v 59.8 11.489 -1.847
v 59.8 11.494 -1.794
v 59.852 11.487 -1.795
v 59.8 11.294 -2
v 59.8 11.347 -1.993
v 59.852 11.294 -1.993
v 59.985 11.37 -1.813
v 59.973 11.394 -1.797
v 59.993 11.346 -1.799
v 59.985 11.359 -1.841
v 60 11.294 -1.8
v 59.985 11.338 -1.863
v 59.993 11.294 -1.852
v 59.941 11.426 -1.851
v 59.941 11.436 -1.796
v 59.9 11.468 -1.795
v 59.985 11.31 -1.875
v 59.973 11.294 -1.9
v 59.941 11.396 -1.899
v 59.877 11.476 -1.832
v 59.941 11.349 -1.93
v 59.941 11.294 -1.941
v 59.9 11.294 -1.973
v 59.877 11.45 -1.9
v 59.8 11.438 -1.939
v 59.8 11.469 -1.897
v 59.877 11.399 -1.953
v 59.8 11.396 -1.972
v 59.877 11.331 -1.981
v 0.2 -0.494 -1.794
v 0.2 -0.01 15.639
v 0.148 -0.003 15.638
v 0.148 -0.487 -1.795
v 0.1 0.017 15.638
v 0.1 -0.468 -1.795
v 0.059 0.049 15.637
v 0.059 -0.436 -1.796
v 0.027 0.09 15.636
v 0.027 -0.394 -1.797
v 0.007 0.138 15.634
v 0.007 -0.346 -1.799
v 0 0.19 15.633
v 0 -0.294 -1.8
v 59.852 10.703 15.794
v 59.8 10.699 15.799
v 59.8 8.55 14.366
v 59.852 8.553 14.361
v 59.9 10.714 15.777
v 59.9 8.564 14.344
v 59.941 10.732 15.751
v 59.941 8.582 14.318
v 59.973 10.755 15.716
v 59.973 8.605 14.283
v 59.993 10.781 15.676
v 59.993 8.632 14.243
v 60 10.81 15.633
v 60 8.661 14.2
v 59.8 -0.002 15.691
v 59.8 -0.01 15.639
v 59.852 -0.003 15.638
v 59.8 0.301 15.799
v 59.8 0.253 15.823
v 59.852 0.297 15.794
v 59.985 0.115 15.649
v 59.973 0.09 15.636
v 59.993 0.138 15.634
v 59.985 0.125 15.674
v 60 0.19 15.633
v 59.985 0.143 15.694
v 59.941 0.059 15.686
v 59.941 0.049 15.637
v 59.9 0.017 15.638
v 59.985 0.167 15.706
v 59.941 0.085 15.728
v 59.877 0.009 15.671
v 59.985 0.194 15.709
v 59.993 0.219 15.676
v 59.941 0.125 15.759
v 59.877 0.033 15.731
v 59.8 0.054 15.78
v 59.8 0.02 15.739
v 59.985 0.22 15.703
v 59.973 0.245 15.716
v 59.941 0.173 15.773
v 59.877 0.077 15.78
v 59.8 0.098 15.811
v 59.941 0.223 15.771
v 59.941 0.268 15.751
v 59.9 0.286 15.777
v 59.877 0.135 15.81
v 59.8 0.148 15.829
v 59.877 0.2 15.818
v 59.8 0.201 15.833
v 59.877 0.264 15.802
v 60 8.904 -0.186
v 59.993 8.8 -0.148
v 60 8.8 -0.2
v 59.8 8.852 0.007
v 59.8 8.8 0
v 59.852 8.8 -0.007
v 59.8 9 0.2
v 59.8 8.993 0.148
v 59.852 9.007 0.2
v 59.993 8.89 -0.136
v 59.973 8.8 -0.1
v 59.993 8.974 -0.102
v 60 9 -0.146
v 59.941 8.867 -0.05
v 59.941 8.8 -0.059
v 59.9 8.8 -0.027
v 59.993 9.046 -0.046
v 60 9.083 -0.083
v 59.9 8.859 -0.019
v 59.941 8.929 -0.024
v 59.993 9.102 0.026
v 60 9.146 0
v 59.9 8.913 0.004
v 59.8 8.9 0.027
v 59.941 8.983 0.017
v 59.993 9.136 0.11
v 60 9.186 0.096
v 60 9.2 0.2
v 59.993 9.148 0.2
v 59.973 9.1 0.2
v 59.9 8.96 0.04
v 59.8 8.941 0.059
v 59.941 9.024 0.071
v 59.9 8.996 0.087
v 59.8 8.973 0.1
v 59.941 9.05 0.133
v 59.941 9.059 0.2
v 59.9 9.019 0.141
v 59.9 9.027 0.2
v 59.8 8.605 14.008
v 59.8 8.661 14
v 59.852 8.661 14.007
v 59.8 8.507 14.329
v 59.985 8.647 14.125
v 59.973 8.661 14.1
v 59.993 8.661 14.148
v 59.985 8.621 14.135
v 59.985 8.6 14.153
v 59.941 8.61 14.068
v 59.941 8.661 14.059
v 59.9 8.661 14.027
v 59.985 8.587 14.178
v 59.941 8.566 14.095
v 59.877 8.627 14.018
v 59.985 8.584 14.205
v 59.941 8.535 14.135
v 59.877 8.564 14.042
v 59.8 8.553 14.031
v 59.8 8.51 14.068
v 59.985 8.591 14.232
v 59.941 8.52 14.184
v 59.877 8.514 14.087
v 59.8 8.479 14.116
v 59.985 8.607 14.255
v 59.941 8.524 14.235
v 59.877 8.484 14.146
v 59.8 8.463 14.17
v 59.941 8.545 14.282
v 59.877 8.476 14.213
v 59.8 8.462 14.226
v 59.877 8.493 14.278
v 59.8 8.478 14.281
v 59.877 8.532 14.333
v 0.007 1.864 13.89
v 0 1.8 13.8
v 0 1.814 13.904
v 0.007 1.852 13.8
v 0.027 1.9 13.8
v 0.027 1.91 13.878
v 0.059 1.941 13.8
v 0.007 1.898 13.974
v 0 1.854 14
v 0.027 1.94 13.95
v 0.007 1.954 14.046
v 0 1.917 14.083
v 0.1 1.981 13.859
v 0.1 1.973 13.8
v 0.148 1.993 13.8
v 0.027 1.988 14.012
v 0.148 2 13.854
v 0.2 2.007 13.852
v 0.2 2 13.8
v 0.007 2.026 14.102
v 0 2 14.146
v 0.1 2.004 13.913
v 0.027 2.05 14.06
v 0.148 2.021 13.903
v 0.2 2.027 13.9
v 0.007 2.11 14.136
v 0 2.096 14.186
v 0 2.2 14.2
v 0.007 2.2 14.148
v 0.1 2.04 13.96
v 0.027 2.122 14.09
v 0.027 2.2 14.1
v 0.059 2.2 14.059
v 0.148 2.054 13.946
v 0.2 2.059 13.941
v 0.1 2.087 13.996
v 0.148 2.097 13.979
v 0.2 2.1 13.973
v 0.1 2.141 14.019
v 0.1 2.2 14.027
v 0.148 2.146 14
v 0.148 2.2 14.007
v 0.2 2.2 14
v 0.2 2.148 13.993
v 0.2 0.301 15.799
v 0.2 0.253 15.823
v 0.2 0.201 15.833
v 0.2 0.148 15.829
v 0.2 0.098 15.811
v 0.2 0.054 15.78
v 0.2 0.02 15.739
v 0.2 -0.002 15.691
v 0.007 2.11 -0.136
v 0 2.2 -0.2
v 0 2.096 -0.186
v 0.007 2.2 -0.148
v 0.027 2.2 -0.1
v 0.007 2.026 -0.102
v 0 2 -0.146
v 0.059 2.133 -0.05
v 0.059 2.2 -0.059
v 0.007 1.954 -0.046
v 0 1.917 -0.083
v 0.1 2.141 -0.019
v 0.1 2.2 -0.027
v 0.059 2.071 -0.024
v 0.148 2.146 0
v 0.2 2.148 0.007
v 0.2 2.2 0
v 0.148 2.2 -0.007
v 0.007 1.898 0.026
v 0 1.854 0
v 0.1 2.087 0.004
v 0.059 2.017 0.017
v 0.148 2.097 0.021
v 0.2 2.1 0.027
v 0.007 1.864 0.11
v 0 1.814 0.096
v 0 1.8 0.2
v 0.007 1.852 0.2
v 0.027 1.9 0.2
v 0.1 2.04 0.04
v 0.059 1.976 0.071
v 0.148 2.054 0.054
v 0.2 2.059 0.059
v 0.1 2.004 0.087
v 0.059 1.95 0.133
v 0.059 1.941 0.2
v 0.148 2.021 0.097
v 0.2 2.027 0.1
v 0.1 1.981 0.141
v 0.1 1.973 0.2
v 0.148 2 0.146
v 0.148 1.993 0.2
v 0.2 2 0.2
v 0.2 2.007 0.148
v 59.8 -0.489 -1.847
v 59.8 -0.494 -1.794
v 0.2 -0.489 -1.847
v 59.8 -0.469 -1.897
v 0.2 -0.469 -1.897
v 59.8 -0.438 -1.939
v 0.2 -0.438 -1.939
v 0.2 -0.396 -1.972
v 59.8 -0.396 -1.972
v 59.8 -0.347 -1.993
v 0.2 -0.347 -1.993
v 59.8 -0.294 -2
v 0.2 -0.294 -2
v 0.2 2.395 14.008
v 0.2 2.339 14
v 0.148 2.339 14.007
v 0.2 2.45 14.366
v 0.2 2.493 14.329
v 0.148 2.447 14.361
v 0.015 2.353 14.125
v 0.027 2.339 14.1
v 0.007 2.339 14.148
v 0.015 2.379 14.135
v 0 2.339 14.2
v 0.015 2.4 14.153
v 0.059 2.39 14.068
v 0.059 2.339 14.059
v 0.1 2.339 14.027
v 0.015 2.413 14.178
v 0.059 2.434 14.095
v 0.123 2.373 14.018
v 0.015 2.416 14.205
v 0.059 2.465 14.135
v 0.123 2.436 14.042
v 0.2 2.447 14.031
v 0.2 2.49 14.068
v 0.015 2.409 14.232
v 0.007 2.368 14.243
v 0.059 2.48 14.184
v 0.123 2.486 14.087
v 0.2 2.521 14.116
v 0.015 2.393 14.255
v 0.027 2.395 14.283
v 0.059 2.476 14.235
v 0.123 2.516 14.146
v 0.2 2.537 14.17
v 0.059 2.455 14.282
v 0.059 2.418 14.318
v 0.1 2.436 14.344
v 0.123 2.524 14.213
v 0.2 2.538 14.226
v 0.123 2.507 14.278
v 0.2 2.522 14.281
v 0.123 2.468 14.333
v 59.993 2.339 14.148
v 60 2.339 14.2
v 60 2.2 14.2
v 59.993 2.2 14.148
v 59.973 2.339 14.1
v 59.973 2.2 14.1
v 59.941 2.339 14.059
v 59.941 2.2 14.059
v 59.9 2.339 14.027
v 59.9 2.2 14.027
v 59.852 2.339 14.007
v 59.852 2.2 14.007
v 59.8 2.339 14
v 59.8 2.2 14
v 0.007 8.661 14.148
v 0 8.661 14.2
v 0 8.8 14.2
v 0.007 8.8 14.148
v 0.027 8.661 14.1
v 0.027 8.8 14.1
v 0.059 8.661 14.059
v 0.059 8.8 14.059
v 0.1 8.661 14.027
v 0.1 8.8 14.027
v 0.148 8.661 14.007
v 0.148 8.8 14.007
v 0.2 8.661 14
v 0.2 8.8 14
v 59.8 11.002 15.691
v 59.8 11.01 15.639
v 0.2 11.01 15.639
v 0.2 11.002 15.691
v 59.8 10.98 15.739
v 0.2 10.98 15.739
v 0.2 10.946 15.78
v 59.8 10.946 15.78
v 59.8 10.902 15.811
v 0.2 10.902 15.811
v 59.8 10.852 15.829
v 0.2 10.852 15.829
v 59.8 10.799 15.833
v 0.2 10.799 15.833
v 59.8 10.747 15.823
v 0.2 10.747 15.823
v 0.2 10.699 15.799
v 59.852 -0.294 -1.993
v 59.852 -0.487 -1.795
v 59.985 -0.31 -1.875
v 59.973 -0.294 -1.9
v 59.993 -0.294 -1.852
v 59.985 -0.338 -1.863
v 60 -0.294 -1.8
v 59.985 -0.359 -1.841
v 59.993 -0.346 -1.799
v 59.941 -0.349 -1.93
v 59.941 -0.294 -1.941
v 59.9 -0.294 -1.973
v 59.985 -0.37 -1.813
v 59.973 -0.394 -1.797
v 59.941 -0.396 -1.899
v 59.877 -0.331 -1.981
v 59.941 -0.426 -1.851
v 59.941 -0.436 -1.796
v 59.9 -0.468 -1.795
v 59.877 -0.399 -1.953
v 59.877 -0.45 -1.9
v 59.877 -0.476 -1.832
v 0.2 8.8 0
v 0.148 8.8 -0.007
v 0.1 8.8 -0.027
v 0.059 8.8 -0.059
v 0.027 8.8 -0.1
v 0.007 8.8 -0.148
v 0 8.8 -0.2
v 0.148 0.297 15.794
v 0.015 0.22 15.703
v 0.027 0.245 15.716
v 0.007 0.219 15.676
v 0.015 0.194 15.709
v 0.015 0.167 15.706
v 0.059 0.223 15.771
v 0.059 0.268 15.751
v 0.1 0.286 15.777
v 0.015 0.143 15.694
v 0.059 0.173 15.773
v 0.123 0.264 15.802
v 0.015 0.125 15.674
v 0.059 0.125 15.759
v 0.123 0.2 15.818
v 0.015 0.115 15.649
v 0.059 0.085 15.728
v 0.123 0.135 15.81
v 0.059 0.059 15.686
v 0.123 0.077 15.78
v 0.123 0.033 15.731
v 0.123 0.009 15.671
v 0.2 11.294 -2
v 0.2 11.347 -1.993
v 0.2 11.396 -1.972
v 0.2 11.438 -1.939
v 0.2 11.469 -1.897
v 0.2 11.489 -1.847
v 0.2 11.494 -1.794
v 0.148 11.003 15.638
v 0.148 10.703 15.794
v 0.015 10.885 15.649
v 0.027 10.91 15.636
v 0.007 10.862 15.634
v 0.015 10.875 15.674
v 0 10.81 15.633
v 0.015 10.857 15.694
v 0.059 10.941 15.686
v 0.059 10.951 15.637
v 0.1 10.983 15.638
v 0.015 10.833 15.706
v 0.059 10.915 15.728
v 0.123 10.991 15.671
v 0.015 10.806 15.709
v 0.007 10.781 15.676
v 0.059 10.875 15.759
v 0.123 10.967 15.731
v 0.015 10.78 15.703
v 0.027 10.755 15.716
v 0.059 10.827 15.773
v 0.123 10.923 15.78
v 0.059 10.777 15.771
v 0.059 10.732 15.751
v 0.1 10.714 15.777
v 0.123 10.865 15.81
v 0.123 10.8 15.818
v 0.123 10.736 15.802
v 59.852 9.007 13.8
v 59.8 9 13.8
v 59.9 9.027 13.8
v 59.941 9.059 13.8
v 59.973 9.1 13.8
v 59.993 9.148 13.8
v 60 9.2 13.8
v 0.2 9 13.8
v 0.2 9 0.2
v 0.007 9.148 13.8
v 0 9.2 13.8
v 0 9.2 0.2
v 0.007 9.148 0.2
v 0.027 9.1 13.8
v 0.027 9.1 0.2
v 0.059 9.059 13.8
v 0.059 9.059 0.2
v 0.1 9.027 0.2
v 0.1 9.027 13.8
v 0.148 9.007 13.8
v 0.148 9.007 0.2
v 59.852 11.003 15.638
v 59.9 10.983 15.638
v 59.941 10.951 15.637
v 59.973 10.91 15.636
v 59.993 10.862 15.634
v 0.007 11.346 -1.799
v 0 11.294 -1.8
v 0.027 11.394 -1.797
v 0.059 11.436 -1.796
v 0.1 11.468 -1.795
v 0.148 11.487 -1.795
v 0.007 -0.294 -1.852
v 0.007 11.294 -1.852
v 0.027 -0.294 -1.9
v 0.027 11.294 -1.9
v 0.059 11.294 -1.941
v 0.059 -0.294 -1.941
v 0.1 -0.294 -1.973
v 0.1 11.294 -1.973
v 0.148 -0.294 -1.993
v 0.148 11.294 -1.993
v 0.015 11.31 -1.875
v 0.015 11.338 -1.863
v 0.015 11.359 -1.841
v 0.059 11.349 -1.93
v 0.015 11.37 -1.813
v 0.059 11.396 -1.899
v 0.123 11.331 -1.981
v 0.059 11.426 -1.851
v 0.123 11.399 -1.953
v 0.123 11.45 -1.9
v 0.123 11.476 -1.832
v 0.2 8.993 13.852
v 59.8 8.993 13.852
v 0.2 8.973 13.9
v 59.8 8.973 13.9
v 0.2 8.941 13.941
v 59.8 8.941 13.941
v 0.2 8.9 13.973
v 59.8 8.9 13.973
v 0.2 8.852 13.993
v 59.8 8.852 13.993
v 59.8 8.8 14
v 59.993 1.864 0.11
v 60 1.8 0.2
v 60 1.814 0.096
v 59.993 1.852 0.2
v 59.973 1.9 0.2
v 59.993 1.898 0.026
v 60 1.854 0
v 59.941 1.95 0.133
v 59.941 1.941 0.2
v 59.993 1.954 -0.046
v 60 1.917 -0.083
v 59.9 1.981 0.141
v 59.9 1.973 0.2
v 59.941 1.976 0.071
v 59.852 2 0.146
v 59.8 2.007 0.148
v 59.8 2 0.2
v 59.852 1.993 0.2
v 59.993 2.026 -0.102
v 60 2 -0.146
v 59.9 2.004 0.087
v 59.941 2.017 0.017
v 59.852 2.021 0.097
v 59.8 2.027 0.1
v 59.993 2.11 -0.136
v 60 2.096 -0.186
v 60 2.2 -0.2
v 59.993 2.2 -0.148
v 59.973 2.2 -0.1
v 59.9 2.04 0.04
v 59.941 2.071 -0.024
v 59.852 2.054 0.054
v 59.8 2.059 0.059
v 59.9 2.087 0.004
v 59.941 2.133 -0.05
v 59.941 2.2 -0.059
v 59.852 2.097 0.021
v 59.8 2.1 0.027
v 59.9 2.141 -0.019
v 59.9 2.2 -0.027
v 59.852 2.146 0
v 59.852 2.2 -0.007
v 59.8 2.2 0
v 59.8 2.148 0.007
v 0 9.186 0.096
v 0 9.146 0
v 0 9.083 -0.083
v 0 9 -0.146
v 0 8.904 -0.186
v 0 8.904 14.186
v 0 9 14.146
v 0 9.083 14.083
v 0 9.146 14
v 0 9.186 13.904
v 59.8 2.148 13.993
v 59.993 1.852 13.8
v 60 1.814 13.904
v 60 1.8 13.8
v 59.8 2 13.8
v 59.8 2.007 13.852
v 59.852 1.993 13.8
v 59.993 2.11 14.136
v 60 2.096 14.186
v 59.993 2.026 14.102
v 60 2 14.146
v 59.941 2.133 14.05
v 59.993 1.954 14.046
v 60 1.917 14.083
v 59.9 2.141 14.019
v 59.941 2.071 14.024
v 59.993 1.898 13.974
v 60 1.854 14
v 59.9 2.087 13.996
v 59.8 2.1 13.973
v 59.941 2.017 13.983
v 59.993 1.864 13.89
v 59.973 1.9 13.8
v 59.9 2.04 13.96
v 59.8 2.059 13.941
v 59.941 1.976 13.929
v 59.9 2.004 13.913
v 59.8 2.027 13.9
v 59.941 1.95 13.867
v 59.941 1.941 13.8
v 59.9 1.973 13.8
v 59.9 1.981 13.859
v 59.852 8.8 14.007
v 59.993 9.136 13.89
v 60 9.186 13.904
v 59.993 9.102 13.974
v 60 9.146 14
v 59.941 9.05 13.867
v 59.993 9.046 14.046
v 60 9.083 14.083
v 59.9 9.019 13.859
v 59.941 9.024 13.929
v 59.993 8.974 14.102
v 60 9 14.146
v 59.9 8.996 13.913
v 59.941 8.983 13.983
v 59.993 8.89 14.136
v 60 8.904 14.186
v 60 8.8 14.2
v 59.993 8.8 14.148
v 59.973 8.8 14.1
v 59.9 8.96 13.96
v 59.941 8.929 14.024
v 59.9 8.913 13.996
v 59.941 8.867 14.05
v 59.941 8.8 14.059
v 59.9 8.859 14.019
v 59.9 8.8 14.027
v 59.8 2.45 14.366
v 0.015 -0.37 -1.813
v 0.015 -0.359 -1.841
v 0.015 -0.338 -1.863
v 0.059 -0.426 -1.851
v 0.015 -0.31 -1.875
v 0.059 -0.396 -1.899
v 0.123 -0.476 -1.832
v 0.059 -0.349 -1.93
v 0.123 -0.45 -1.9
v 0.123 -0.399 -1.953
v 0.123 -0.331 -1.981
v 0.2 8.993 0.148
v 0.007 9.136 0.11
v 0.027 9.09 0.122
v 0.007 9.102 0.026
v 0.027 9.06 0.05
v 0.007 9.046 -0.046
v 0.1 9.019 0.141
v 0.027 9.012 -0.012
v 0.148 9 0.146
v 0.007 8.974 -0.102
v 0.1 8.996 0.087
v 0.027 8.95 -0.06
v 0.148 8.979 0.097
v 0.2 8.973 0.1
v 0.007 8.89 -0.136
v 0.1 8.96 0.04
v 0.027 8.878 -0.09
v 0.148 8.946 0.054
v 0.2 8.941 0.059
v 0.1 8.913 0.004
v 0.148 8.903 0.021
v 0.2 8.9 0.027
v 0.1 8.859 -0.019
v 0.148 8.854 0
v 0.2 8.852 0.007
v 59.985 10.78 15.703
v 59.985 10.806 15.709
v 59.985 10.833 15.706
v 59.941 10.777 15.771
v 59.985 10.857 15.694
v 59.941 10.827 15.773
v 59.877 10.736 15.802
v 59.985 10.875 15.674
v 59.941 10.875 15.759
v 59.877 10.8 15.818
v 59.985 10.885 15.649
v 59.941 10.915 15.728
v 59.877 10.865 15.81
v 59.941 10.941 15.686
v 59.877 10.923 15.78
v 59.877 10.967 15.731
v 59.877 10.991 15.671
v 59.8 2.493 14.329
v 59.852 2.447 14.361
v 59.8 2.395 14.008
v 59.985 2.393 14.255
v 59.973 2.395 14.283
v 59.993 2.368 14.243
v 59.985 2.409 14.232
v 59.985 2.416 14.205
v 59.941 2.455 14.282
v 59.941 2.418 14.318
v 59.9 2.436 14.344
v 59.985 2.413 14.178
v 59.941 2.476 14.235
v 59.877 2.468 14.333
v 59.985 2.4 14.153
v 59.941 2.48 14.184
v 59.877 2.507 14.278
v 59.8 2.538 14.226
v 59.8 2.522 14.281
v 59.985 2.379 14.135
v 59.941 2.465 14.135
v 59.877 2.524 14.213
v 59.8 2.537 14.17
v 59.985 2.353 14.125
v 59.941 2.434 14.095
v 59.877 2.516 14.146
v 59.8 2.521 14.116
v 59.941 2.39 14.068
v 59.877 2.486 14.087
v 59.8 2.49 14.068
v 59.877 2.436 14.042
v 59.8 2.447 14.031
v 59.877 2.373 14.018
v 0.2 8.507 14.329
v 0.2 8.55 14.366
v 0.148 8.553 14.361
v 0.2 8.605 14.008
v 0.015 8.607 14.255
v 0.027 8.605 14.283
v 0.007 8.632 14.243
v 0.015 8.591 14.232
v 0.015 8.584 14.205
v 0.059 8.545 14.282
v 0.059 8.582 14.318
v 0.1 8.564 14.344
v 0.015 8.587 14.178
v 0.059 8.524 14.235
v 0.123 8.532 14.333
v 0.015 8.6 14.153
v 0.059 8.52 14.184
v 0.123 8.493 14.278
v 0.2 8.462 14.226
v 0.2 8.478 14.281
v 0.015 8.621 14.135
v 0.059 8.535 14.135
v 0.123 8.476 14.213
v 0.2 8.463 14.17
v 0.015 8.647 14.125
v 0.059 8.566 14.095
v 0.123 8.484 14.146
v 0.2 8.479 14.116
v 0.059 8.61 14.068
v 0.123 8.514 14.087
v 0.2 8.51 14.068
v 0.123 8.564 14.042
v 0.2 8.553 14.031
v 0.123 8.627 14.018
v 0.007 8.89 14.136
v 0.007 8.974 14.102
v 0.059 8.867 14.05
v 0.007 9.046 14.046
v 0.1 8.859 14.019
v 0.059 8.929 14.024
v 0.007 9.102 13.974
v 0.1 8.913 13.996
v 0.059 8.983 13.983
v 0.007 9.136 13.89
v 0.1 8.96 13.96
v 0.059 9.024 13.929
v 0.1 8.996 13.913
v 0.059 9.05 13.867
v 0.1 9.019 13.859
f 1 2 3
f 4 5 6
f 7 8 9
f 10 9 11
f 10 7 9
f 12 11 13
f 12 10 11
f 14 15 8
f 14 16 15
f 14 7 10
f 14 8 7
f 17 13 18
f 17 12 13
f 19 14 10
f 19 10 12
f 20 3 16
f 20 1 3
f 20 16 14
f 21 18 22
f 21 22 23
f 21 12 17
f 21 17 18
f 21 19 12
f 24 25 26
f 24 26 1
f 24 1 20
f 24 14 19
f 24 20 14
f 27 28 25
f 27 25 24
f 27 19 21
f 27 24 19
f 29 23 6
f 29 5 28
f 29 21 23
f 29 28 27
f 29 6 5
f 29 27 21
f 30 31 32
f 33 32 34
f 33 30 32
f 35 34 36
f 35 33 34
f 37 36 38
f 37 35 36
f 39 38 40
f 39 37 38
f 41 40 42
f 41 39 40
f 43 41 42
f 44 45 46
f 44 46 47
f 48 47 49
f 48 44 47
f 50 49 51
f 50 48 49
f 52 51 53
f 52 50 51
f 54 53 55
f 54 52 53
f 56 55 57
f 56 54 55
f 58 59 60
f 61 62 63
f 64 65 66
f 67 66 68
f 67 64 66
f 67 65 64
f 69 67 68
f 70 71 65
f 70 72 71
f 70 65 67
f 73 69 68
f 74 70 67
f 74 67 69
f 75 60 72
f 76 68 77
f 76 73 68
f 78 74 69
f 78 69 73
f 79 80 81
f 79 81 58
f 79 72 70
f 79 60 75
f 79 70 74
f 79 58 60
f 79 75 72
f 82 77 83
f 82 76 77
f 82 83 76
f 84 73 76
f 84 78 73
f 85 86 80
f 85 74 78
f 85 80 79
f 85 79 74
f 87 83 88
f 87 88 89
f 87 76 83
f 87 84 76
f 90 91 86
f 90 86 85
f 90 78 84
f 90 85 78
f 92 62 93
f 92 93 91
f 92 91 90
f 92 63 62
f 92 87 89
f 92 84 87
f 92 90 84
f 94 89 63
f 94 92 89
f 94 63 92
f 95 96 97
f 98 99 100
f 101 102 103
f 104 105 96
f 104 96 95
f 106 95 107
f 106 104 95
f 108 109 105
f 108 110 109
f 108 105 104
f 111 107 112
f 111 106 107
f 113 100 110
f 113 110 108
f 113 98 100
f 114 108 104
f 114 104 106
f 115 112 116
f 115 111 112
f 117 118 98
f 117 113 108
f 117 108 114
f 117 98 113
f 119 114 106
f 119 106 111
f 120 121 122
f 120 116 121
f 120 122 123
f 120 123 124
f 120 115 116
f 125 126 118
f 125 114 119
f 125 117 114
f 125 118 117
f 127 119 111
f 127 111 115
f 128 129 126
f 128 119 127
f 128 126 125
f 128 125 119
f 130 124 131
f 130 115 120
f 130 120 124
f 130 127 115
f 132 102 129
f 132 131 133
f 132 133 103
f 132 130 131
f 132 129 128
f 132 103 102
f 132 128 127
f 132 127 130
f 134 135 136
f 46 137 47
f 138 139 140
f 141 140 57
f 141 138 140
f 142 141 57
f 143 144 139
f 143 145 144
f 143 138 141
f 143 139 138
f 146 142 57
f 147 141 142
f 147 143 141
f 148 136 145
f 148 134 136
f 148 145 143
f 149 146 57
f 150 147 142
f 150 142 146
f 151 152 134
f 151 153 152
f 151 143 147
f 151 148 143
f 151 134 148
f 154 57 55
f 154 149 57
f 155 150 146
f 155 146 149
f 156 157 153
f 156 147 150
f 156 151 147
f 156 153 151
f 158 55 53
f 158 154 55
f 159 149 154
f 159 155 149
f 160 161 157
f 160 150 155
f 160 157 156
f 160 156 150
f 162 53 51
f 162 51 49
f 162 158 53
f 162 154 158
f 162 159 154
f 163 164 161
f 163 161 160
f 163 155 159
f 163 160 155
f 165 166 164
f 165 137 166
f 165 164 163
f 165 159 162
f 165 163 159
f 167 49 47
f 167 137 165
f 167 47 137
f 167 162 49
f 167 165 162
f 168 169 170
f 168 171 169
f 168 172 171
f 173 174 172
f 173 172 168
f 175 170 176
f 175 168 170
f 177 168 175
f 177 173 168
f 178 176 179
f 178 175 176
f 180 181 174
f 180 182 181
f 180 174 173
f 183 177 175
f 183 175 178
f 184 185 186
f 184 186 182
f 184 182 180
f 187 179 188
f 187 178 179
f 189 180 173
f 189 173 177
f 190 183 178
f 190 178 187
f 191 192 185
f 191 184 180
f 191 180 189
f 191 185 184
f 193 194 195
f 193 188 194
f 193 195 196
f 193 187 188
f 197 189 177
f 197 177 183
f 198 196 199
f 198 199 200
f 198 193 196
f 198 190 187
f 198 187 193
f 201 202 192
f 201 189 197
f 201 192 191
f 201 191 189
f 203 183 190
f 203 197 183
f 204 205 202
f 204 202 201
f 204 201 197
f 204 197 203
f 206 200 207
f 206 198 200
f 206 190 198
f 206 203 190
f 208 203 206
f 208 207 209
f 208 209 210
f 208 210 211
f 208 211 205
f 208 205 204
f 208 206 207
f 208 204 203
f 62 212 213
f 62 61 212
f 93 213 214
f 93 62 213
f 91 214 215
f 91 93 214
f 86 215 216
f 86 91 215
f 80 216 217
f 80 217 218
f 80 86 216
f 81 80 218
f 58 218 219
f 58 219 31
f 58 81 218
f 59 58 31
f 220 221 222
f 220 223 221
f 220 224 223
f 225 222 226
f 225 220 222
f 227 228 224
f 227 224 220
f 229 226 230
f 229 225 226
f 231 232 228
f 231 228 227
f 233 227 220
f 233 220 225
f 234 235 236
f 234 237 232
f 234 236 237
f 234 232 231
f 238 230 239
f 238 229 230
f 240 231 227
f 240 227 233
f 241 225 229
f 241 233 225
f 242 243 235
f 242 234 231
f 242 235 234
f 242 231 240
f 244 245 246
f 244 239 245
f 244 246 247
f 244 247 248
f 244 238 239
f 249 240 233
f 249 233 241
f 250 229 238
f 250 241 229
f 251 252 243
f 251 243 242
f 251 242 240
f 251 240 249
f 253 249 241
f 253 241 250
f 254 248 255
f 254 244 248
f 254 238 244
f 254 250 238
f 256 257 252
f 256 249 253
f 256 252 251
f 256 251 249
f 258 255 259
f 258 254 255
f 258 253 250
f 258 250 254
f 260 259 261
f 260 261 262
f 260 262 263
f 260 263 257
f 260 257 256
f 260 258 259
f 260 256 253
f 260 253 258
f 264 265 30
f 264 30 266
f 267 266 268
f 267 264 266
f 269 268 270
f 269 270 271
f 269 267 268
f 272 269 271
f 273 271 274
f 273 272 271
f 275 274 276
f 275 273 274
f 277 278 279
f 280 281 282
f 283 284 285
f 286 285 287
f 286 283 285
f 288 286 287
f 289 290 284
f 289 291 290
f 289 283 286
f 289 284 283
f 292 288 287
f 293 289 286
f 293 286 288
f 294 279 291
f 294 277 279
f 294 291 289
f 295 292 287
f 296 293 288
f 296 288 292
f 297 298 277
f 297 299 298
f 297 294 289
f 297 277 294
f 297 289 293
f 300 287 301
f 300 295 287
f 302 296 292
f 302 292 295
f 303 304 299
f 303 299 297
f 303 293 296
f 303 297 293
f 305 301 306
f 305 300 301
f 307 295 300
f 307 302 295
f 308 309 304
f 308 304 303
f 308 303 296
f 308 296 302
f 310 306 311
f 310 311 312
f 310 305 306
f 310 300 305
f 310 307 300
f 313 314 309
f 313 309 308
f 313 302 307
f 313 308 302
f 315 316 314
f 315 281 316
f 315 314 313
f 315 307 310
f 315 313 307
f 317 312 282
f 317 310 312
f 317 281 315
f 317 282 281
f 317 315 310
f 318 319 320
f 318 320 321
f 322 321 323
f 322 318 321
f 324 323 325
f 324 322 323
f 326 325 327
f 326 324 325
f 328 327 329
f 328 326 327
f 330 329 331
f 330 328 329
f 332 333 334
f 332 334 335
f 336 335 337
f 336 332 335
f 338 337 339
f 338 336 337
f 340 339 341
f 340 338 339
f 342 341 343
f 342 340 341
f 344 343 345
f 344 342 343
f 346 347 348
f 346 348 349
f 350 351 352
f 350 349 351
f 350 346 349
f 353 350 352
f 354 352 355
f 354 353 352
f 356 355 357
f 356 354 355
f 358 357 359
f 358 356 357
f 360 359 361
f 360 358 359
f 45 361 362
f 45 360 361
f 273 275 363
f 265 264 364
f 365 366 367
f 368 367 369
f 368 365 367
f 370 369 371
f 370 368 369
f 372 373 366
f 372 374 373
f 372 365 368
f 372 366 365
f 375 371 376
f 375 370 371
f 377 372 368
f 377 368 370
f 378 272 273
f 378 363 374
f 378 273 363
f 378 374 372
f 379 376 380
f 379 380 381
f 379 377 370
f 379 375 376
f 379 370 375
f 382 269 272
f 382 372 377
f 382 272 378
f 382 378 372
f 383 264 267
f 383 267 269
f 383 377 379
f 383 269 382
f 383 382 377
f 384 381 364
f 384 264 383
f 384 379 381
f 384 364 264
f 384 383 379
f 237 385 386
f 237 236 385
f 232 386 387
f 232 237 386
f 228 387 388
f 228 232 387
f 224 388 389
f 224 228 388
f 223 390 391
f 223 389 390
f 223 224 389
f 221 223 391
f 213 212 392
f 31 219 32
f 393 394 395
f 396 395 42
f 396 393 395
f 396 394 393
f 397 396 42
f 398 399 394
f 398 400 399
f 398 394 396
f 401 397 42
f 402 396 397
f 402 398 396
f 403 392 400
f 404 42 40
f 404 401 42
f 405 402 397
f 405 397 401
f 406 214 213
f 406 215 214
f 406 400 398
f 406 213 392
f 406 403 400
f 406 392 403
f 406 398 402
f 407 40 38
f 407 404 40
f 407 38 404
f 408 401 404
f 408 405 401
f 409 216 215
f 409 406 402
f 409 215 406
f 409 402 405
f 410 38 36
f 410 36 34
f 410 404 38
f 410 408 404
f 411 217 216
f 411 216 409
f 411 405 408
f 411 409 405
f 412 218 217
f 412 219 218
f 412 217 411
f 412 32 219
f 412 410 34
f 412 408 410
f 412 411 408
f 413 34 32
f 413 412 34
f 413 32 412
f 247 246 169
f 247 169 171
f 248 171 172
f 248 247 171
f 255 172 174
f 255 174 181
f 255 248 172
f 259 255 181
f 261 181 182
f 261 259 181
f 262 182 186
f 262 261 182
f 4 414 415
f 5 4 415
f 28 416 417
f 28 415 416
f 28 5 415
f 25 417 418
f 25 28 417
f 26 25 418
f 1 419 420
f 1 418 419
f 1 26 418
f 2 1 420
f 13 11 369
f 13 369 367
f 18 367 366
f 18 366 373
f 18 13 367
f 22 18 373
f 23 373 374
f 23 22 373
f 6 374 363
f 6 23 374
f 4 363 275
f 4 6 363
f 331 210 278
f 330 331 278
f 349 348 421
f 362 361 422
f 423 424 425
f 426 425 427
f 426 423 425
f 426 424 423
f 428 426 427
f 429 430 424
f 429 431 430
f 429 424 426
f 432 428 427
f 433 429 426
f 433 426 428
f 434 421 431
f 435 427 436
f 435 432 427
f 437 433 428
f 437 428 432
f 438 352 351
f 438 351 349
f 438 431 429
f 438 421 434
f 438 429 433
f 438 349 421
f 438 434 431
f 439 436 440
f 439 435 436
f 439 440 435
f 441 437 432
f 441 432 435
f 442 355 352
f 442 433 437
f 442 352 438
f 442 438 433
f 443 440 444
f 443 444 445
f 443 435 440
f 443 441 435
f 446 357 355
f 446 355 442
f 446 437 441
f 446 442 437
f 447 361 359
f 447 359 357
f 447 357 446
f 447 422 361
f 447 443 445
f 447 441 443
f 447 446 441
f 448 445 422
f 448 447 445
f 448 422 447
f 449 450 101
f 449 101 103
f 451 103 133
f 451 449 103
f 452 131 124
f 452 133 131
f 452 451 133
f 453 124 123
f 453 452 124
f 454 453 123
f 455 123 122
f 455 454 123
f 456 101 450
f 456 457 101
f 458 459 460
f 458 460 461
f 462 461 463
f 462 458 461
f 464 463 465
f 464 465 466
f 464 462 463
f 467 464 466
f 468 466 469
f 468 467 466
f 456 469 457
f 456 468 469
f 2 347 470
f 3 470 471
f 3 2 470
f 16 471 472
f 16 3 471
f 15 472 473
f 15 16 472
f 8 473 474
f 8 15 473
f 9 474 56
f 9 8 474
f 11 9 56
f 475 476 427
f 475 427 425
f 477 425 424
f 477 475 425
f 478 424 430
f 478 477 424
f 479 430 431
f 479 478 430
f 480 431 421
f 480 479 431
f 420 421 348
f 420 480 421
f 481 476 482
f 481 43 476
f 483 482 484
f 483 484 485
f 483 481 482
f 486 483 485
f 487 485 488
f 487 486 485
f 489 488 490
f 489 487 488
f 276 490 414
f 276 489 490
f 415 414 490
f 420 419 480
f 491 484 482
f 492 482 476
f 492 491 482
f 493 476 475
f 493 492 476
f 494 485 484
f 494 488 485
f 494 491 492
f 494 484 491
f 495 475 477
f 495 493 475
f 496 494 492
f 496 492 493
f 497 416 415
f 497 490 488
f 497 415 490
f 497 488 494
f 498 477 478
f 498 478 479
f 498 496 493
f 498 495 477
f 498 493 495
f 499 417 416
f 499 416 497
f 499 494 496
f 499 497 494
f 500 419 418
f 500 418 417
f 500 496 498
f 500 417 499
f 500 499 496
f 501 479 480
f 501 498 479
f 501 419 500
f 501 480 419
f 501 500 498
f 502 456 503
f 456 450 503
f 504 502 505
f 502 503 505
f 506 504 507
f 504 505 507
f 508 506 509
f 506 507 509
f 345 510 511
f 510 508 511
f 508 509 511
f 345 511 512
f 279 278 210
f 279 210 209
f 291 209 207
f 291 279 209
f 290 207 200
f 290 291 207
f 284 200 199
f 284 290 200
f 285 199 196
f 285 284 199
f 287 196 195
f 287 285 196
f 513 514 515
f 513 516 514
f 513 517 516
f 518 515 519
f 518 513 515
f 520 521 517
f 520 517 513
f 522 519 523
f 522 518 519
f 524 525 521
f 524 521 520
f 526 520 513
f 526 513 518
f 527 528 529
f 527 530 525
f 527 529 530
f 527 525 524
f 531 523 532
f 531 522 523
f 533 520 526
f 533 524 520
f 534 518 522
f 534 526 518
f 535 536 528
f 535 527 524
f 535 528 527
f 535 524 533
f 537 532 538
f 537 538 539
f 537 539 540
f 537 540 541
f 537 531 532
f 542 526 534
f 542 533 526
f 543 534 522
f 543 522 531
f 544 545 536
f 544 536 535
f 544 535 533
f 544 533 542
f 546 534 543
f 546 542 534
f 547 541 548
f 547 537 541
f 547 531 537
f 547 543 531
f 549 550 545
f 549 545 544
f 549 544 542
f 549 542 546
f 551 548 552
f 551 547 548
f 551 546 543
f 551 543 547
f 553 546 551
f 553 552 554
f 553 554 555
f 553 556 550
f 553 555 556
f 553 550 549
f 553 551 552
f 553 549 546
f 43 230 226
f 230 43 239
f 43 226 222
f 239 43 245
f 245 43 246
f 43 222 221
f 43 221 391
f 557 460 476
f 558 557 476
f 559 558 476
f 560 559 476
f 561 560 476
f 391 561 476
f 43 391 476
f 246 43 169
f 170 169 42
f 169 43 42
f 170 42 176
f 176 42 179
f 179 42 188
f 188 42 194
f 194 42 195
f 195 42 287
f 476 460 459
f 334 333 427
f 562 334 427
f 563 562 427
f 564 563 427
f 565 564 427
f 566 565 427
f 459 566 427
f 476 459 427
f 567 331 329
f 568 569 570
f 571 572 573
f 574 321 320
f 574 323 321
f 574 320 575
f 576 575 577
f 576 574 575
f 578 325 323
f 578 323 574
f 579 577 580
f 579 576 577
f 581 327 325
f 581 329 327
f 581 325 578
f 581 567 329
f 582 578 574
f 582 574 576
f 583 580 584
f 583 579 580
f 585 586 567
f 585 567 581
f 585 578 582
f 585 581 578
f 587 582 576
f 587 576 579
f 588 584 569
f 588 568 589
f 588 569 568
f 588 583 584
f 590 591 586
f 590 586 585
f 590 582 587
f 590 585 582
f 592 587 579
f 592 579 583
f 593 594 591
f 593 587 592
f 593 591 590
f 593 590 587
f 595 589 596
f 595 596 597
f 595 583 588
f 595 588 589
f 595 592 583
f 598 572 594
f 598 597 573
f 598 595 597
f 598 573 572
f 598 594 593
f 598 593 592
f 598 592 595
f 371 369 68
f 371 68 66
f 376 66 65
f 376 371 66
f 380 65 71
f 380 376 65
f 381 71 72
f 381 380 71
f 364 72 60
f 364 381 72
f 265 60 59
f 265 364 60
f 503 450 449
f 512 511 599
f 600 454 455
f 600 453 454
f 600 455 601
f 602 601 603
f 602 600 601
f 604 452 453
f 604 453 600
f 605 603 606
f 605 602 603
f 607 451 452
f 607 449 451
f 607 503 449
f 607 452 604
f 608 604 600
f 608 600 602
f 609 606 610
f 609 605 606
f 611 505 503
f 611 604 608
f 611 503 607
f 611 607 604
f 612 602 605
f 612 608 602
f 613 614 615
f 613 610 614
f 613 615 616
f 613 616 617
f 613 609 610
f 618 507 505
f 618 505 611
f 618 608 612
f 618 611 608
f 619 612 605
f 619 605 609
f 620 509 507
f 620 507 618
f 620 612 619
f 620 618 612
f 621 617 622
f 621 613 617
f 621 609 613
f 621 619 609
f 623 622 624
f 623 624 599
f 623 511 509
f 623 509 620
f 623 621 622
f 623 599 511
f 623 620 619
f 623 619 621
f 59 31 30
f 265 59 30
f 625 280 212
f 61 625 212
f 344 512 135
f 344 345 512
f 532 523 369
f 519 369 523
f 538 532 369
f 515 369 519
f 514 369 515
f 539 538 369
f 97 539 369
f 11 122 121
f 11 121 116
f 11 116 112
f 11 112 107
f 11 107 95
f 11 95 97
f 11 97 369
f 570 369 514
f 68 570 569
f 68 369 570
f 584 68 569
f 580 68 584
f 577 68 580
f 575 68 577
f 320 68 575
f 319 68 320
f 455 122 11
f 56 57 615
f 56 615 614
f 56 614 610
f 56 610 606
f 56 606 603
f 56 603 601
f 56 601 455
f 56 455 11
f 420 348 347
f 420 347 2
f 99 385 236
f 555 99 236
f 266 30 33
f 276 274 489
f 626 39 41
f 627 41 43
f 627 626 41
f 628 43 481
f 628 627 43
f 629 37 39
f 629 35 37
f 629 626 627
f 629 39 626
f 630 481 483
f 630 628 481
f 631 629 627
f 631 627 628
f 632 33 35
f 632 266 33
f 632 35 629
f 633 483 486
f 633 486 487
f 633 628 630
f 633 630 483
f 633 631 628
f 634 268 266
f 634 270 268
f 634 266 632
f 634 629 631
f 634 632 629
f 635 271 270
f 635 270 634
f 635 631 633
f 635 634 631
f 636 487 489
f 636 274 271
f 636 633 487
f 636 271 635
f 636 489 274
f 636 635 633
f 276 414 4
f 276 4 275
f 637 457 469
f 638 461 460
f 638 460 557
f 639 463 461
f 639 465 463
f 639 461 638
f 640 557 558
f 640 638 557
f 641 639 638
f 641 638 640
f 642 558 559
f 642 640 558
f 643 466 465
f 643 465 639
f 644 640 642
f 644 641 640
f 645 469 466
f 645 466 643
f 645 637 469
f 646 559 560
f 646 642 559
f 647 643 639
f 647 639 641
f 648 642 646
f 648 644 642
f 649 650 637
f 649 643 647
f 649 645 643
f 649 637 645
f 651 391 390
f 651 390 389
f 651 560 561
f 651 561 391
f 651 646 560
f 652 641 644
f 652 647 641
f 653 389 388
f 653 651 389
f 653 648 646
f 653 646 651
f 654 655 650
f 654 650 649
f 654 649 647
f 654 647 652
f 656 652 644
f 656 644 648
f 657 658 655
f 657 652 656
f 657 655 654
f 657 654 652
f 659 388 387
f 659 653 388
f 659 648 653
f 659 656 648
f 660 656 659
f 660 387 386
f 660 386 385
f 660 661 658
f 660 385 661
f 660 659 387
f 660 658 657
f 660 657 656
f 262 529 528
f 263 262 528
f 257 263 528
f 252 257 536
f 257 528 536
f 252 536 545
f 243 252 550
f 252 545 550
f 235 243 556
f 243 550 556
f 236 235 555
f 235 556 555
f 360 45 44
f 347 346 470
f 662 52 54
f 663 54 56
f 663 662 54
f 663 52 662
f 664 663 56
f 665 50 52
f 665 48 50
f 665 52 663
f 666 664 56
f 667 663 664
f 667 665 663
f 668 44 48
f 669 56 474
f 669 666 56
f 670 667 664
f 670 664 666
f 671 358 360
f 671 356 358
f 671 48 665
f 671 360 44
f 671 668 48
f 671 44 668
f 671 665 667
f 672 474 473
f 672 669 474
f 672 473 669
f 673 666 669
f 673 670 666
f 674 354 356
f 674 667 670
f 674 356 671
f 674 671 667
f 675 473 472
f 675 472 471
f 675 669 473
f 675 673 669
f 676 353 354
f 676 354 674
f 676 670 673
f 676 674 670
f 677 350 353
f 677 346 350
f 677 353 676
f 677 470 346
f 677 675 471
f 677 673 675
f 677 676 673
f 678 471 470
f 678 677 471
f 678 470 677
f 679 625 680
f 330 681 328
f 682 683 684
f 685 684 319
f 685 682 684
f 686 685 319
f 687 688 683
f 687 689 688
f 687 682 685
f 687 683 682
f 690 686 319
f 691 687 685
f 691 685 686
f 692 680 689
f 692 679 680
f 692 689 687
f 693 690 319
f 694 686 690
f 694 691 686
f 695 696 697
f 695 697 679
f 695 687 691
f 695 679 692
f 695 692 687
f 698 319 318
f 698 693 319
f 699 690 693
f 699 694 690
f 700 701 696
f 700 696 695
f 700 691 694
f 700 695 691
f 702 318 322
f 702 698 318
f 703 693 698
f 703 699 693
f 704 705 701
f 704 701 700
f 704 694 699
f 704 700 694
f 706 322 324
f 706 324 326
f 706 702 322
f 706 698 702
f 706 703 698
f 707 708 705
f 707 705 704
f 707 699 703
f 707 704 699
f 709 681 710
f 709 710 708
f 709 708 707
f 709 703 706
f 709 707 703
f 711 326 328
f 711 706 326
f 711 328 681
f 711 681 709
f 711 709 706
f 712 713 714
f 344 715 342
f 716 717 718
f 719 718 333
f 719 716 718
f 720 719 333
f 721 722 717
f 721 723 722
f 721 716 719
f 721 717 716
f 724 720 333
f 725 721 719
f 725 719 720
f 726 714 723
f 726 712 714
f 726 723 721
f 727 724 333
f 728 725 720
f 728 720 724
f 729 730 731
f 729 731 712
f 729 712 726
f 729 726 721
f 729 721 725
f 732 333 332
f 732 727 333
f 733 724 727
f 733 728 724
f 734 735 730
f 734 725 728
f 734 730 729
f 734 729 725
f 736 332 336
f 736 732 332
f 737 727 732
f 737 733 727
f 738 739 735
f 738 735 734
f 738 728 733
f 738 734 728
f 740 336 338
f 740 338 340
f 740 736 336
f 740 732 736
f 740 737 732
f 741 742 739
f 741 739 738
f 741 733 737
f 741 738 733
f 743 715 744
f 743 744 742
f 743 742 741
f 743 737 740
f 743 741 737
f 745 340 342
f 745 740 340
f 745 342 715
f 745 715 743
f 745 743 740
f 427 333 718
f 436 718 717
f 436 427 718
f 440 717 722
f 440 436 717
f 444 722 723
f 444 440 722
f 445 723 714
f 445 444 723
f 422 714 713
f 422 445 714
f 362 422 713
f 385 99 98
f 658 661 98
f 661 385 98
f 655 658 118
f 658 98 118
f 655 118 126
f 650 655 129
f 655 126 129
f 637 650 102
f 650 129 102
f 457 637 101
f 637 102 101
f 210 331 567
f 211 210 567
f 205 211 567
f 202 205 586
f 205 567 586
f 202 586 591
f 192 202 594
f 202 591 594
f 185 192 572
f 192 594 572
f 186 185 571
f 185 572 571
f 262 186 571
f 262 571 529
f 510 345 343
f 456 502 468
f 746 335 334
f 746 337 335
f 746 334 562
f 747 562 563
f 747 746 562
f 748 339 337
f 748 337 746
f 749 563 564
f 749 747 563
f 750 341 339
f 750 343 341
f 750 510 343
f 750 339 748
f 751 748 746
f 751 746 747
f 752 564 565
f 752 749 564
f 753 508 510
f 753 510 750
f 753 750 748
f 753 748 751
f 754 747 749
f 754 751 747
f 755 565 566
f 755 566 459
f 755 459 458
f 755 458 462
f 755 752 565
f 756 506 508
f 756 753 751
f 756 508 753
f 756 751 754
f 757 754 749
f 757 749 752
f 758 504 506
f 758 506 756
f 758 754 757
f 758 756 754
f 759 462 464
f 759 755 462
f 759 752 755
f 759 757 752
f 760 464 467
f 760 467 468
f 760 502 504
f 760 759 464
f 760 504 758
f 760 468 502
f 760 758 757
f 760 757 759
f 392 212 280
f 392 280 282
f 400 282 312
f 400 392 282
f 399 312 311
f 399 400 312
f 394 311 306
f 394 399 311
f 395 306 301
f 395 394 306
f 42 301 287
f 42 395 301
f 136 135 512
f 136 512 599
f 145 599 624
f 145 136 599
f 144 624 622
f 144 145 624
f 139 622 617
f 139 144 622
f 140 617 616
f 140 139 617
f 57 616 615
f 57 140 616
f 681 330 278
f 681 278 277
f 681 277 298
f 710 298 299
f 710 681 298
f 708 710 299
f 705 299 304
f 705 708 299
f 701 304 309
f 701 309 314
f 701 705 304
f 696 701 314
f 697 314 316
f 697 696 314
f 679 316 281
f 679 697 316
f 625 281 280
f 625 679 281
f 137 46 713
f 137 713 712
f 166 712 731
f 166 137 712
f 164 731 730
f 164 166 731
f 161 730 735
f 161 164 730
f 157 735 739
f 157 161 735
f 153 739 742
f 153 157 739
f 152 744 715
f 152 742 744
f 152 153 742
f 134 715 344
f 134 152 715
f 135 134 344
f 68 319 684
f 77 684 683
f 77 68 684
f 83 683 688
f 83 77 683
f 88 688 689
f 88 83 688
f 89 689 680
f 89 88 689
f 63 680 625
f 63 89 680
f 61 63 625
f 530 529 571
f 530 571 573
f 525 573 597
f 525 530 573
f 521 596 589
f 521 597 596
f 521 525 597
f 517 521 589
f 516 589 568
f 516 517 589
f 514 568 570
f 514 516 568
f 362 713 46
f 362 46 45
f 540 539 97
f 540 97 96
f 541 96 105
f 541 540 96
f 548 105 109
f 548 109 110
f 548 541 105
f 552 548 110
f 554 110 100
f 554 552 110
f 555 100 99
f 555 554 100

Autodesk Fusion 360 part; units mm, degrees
sketch "Skizze1" plane through (0, 0, 0) normal (0, 0, 1) x (1, 0, 0)
  line L0 (0, 0) -> (100, 0)
  line L1 (100, 0) -> (100, 10)
  line L2 (100, 10) -> (0, 10)
  line L3 (0, 10) -> (0, 0)
sketch "Skizze2" plane through (0, 0, 0) normal (1, 0, 0) x (0, 1, 0)
  line L0 (10, 0) -> (0, 0)
  line L1 (2, 14) -> (2, 0)
  line L2 (9, 0) -> (9, 14)
  line L3 (2, 14) -> (3, 14)
  line L4 (3, 14) -> (0, 16)
  line L5 (0, 16) -> (0, 0)
  line L6 (9, 14) -> (8, 14)
  line L7 (8, 14) -> (11, 16)
  line L8 (11, 16) -> (11, 0)
  line L9 (11, 0) -> (11, -2)
  line L10 (11, -2) -> (0, -2)
  line L11 (0, -2) -> (0, 0)
  line L12 (0, 16) -> (-0.5, -2)
  line L13 (-0.5, -2) -> (0, -2)
  line L14 (11, 16) -> (11.5, -2)
  line L15 (11, -2) -> (11.5, -2)
  dimension "d1" = 7
  dimension "d3" = 5
  dimension "d4" = 14
  dimension "d6" = 2
  dimension "d7" = 2
  dimension "d9" = 2
  dimension "d10" = 2
  dimension "d11" = 11
  dimension "d13" = 2
  dimension "d18" = 12
extrude "Extrusion1" add sketch "Skizze2" along normal blind 60
fillet "Abrundung1" radius 0.2 10 faces at (20, 8.6667, 14) (20, 9, 14.6667) (20, 2.3333, 14) (20, 2, 9.3333) (20, 2, 14.6667) (60, 1.1667, 4) (20, 3.5, -2) (0, 1.1667, 4) (20, 9, 4.6667) (20, 6.6667, 0)
